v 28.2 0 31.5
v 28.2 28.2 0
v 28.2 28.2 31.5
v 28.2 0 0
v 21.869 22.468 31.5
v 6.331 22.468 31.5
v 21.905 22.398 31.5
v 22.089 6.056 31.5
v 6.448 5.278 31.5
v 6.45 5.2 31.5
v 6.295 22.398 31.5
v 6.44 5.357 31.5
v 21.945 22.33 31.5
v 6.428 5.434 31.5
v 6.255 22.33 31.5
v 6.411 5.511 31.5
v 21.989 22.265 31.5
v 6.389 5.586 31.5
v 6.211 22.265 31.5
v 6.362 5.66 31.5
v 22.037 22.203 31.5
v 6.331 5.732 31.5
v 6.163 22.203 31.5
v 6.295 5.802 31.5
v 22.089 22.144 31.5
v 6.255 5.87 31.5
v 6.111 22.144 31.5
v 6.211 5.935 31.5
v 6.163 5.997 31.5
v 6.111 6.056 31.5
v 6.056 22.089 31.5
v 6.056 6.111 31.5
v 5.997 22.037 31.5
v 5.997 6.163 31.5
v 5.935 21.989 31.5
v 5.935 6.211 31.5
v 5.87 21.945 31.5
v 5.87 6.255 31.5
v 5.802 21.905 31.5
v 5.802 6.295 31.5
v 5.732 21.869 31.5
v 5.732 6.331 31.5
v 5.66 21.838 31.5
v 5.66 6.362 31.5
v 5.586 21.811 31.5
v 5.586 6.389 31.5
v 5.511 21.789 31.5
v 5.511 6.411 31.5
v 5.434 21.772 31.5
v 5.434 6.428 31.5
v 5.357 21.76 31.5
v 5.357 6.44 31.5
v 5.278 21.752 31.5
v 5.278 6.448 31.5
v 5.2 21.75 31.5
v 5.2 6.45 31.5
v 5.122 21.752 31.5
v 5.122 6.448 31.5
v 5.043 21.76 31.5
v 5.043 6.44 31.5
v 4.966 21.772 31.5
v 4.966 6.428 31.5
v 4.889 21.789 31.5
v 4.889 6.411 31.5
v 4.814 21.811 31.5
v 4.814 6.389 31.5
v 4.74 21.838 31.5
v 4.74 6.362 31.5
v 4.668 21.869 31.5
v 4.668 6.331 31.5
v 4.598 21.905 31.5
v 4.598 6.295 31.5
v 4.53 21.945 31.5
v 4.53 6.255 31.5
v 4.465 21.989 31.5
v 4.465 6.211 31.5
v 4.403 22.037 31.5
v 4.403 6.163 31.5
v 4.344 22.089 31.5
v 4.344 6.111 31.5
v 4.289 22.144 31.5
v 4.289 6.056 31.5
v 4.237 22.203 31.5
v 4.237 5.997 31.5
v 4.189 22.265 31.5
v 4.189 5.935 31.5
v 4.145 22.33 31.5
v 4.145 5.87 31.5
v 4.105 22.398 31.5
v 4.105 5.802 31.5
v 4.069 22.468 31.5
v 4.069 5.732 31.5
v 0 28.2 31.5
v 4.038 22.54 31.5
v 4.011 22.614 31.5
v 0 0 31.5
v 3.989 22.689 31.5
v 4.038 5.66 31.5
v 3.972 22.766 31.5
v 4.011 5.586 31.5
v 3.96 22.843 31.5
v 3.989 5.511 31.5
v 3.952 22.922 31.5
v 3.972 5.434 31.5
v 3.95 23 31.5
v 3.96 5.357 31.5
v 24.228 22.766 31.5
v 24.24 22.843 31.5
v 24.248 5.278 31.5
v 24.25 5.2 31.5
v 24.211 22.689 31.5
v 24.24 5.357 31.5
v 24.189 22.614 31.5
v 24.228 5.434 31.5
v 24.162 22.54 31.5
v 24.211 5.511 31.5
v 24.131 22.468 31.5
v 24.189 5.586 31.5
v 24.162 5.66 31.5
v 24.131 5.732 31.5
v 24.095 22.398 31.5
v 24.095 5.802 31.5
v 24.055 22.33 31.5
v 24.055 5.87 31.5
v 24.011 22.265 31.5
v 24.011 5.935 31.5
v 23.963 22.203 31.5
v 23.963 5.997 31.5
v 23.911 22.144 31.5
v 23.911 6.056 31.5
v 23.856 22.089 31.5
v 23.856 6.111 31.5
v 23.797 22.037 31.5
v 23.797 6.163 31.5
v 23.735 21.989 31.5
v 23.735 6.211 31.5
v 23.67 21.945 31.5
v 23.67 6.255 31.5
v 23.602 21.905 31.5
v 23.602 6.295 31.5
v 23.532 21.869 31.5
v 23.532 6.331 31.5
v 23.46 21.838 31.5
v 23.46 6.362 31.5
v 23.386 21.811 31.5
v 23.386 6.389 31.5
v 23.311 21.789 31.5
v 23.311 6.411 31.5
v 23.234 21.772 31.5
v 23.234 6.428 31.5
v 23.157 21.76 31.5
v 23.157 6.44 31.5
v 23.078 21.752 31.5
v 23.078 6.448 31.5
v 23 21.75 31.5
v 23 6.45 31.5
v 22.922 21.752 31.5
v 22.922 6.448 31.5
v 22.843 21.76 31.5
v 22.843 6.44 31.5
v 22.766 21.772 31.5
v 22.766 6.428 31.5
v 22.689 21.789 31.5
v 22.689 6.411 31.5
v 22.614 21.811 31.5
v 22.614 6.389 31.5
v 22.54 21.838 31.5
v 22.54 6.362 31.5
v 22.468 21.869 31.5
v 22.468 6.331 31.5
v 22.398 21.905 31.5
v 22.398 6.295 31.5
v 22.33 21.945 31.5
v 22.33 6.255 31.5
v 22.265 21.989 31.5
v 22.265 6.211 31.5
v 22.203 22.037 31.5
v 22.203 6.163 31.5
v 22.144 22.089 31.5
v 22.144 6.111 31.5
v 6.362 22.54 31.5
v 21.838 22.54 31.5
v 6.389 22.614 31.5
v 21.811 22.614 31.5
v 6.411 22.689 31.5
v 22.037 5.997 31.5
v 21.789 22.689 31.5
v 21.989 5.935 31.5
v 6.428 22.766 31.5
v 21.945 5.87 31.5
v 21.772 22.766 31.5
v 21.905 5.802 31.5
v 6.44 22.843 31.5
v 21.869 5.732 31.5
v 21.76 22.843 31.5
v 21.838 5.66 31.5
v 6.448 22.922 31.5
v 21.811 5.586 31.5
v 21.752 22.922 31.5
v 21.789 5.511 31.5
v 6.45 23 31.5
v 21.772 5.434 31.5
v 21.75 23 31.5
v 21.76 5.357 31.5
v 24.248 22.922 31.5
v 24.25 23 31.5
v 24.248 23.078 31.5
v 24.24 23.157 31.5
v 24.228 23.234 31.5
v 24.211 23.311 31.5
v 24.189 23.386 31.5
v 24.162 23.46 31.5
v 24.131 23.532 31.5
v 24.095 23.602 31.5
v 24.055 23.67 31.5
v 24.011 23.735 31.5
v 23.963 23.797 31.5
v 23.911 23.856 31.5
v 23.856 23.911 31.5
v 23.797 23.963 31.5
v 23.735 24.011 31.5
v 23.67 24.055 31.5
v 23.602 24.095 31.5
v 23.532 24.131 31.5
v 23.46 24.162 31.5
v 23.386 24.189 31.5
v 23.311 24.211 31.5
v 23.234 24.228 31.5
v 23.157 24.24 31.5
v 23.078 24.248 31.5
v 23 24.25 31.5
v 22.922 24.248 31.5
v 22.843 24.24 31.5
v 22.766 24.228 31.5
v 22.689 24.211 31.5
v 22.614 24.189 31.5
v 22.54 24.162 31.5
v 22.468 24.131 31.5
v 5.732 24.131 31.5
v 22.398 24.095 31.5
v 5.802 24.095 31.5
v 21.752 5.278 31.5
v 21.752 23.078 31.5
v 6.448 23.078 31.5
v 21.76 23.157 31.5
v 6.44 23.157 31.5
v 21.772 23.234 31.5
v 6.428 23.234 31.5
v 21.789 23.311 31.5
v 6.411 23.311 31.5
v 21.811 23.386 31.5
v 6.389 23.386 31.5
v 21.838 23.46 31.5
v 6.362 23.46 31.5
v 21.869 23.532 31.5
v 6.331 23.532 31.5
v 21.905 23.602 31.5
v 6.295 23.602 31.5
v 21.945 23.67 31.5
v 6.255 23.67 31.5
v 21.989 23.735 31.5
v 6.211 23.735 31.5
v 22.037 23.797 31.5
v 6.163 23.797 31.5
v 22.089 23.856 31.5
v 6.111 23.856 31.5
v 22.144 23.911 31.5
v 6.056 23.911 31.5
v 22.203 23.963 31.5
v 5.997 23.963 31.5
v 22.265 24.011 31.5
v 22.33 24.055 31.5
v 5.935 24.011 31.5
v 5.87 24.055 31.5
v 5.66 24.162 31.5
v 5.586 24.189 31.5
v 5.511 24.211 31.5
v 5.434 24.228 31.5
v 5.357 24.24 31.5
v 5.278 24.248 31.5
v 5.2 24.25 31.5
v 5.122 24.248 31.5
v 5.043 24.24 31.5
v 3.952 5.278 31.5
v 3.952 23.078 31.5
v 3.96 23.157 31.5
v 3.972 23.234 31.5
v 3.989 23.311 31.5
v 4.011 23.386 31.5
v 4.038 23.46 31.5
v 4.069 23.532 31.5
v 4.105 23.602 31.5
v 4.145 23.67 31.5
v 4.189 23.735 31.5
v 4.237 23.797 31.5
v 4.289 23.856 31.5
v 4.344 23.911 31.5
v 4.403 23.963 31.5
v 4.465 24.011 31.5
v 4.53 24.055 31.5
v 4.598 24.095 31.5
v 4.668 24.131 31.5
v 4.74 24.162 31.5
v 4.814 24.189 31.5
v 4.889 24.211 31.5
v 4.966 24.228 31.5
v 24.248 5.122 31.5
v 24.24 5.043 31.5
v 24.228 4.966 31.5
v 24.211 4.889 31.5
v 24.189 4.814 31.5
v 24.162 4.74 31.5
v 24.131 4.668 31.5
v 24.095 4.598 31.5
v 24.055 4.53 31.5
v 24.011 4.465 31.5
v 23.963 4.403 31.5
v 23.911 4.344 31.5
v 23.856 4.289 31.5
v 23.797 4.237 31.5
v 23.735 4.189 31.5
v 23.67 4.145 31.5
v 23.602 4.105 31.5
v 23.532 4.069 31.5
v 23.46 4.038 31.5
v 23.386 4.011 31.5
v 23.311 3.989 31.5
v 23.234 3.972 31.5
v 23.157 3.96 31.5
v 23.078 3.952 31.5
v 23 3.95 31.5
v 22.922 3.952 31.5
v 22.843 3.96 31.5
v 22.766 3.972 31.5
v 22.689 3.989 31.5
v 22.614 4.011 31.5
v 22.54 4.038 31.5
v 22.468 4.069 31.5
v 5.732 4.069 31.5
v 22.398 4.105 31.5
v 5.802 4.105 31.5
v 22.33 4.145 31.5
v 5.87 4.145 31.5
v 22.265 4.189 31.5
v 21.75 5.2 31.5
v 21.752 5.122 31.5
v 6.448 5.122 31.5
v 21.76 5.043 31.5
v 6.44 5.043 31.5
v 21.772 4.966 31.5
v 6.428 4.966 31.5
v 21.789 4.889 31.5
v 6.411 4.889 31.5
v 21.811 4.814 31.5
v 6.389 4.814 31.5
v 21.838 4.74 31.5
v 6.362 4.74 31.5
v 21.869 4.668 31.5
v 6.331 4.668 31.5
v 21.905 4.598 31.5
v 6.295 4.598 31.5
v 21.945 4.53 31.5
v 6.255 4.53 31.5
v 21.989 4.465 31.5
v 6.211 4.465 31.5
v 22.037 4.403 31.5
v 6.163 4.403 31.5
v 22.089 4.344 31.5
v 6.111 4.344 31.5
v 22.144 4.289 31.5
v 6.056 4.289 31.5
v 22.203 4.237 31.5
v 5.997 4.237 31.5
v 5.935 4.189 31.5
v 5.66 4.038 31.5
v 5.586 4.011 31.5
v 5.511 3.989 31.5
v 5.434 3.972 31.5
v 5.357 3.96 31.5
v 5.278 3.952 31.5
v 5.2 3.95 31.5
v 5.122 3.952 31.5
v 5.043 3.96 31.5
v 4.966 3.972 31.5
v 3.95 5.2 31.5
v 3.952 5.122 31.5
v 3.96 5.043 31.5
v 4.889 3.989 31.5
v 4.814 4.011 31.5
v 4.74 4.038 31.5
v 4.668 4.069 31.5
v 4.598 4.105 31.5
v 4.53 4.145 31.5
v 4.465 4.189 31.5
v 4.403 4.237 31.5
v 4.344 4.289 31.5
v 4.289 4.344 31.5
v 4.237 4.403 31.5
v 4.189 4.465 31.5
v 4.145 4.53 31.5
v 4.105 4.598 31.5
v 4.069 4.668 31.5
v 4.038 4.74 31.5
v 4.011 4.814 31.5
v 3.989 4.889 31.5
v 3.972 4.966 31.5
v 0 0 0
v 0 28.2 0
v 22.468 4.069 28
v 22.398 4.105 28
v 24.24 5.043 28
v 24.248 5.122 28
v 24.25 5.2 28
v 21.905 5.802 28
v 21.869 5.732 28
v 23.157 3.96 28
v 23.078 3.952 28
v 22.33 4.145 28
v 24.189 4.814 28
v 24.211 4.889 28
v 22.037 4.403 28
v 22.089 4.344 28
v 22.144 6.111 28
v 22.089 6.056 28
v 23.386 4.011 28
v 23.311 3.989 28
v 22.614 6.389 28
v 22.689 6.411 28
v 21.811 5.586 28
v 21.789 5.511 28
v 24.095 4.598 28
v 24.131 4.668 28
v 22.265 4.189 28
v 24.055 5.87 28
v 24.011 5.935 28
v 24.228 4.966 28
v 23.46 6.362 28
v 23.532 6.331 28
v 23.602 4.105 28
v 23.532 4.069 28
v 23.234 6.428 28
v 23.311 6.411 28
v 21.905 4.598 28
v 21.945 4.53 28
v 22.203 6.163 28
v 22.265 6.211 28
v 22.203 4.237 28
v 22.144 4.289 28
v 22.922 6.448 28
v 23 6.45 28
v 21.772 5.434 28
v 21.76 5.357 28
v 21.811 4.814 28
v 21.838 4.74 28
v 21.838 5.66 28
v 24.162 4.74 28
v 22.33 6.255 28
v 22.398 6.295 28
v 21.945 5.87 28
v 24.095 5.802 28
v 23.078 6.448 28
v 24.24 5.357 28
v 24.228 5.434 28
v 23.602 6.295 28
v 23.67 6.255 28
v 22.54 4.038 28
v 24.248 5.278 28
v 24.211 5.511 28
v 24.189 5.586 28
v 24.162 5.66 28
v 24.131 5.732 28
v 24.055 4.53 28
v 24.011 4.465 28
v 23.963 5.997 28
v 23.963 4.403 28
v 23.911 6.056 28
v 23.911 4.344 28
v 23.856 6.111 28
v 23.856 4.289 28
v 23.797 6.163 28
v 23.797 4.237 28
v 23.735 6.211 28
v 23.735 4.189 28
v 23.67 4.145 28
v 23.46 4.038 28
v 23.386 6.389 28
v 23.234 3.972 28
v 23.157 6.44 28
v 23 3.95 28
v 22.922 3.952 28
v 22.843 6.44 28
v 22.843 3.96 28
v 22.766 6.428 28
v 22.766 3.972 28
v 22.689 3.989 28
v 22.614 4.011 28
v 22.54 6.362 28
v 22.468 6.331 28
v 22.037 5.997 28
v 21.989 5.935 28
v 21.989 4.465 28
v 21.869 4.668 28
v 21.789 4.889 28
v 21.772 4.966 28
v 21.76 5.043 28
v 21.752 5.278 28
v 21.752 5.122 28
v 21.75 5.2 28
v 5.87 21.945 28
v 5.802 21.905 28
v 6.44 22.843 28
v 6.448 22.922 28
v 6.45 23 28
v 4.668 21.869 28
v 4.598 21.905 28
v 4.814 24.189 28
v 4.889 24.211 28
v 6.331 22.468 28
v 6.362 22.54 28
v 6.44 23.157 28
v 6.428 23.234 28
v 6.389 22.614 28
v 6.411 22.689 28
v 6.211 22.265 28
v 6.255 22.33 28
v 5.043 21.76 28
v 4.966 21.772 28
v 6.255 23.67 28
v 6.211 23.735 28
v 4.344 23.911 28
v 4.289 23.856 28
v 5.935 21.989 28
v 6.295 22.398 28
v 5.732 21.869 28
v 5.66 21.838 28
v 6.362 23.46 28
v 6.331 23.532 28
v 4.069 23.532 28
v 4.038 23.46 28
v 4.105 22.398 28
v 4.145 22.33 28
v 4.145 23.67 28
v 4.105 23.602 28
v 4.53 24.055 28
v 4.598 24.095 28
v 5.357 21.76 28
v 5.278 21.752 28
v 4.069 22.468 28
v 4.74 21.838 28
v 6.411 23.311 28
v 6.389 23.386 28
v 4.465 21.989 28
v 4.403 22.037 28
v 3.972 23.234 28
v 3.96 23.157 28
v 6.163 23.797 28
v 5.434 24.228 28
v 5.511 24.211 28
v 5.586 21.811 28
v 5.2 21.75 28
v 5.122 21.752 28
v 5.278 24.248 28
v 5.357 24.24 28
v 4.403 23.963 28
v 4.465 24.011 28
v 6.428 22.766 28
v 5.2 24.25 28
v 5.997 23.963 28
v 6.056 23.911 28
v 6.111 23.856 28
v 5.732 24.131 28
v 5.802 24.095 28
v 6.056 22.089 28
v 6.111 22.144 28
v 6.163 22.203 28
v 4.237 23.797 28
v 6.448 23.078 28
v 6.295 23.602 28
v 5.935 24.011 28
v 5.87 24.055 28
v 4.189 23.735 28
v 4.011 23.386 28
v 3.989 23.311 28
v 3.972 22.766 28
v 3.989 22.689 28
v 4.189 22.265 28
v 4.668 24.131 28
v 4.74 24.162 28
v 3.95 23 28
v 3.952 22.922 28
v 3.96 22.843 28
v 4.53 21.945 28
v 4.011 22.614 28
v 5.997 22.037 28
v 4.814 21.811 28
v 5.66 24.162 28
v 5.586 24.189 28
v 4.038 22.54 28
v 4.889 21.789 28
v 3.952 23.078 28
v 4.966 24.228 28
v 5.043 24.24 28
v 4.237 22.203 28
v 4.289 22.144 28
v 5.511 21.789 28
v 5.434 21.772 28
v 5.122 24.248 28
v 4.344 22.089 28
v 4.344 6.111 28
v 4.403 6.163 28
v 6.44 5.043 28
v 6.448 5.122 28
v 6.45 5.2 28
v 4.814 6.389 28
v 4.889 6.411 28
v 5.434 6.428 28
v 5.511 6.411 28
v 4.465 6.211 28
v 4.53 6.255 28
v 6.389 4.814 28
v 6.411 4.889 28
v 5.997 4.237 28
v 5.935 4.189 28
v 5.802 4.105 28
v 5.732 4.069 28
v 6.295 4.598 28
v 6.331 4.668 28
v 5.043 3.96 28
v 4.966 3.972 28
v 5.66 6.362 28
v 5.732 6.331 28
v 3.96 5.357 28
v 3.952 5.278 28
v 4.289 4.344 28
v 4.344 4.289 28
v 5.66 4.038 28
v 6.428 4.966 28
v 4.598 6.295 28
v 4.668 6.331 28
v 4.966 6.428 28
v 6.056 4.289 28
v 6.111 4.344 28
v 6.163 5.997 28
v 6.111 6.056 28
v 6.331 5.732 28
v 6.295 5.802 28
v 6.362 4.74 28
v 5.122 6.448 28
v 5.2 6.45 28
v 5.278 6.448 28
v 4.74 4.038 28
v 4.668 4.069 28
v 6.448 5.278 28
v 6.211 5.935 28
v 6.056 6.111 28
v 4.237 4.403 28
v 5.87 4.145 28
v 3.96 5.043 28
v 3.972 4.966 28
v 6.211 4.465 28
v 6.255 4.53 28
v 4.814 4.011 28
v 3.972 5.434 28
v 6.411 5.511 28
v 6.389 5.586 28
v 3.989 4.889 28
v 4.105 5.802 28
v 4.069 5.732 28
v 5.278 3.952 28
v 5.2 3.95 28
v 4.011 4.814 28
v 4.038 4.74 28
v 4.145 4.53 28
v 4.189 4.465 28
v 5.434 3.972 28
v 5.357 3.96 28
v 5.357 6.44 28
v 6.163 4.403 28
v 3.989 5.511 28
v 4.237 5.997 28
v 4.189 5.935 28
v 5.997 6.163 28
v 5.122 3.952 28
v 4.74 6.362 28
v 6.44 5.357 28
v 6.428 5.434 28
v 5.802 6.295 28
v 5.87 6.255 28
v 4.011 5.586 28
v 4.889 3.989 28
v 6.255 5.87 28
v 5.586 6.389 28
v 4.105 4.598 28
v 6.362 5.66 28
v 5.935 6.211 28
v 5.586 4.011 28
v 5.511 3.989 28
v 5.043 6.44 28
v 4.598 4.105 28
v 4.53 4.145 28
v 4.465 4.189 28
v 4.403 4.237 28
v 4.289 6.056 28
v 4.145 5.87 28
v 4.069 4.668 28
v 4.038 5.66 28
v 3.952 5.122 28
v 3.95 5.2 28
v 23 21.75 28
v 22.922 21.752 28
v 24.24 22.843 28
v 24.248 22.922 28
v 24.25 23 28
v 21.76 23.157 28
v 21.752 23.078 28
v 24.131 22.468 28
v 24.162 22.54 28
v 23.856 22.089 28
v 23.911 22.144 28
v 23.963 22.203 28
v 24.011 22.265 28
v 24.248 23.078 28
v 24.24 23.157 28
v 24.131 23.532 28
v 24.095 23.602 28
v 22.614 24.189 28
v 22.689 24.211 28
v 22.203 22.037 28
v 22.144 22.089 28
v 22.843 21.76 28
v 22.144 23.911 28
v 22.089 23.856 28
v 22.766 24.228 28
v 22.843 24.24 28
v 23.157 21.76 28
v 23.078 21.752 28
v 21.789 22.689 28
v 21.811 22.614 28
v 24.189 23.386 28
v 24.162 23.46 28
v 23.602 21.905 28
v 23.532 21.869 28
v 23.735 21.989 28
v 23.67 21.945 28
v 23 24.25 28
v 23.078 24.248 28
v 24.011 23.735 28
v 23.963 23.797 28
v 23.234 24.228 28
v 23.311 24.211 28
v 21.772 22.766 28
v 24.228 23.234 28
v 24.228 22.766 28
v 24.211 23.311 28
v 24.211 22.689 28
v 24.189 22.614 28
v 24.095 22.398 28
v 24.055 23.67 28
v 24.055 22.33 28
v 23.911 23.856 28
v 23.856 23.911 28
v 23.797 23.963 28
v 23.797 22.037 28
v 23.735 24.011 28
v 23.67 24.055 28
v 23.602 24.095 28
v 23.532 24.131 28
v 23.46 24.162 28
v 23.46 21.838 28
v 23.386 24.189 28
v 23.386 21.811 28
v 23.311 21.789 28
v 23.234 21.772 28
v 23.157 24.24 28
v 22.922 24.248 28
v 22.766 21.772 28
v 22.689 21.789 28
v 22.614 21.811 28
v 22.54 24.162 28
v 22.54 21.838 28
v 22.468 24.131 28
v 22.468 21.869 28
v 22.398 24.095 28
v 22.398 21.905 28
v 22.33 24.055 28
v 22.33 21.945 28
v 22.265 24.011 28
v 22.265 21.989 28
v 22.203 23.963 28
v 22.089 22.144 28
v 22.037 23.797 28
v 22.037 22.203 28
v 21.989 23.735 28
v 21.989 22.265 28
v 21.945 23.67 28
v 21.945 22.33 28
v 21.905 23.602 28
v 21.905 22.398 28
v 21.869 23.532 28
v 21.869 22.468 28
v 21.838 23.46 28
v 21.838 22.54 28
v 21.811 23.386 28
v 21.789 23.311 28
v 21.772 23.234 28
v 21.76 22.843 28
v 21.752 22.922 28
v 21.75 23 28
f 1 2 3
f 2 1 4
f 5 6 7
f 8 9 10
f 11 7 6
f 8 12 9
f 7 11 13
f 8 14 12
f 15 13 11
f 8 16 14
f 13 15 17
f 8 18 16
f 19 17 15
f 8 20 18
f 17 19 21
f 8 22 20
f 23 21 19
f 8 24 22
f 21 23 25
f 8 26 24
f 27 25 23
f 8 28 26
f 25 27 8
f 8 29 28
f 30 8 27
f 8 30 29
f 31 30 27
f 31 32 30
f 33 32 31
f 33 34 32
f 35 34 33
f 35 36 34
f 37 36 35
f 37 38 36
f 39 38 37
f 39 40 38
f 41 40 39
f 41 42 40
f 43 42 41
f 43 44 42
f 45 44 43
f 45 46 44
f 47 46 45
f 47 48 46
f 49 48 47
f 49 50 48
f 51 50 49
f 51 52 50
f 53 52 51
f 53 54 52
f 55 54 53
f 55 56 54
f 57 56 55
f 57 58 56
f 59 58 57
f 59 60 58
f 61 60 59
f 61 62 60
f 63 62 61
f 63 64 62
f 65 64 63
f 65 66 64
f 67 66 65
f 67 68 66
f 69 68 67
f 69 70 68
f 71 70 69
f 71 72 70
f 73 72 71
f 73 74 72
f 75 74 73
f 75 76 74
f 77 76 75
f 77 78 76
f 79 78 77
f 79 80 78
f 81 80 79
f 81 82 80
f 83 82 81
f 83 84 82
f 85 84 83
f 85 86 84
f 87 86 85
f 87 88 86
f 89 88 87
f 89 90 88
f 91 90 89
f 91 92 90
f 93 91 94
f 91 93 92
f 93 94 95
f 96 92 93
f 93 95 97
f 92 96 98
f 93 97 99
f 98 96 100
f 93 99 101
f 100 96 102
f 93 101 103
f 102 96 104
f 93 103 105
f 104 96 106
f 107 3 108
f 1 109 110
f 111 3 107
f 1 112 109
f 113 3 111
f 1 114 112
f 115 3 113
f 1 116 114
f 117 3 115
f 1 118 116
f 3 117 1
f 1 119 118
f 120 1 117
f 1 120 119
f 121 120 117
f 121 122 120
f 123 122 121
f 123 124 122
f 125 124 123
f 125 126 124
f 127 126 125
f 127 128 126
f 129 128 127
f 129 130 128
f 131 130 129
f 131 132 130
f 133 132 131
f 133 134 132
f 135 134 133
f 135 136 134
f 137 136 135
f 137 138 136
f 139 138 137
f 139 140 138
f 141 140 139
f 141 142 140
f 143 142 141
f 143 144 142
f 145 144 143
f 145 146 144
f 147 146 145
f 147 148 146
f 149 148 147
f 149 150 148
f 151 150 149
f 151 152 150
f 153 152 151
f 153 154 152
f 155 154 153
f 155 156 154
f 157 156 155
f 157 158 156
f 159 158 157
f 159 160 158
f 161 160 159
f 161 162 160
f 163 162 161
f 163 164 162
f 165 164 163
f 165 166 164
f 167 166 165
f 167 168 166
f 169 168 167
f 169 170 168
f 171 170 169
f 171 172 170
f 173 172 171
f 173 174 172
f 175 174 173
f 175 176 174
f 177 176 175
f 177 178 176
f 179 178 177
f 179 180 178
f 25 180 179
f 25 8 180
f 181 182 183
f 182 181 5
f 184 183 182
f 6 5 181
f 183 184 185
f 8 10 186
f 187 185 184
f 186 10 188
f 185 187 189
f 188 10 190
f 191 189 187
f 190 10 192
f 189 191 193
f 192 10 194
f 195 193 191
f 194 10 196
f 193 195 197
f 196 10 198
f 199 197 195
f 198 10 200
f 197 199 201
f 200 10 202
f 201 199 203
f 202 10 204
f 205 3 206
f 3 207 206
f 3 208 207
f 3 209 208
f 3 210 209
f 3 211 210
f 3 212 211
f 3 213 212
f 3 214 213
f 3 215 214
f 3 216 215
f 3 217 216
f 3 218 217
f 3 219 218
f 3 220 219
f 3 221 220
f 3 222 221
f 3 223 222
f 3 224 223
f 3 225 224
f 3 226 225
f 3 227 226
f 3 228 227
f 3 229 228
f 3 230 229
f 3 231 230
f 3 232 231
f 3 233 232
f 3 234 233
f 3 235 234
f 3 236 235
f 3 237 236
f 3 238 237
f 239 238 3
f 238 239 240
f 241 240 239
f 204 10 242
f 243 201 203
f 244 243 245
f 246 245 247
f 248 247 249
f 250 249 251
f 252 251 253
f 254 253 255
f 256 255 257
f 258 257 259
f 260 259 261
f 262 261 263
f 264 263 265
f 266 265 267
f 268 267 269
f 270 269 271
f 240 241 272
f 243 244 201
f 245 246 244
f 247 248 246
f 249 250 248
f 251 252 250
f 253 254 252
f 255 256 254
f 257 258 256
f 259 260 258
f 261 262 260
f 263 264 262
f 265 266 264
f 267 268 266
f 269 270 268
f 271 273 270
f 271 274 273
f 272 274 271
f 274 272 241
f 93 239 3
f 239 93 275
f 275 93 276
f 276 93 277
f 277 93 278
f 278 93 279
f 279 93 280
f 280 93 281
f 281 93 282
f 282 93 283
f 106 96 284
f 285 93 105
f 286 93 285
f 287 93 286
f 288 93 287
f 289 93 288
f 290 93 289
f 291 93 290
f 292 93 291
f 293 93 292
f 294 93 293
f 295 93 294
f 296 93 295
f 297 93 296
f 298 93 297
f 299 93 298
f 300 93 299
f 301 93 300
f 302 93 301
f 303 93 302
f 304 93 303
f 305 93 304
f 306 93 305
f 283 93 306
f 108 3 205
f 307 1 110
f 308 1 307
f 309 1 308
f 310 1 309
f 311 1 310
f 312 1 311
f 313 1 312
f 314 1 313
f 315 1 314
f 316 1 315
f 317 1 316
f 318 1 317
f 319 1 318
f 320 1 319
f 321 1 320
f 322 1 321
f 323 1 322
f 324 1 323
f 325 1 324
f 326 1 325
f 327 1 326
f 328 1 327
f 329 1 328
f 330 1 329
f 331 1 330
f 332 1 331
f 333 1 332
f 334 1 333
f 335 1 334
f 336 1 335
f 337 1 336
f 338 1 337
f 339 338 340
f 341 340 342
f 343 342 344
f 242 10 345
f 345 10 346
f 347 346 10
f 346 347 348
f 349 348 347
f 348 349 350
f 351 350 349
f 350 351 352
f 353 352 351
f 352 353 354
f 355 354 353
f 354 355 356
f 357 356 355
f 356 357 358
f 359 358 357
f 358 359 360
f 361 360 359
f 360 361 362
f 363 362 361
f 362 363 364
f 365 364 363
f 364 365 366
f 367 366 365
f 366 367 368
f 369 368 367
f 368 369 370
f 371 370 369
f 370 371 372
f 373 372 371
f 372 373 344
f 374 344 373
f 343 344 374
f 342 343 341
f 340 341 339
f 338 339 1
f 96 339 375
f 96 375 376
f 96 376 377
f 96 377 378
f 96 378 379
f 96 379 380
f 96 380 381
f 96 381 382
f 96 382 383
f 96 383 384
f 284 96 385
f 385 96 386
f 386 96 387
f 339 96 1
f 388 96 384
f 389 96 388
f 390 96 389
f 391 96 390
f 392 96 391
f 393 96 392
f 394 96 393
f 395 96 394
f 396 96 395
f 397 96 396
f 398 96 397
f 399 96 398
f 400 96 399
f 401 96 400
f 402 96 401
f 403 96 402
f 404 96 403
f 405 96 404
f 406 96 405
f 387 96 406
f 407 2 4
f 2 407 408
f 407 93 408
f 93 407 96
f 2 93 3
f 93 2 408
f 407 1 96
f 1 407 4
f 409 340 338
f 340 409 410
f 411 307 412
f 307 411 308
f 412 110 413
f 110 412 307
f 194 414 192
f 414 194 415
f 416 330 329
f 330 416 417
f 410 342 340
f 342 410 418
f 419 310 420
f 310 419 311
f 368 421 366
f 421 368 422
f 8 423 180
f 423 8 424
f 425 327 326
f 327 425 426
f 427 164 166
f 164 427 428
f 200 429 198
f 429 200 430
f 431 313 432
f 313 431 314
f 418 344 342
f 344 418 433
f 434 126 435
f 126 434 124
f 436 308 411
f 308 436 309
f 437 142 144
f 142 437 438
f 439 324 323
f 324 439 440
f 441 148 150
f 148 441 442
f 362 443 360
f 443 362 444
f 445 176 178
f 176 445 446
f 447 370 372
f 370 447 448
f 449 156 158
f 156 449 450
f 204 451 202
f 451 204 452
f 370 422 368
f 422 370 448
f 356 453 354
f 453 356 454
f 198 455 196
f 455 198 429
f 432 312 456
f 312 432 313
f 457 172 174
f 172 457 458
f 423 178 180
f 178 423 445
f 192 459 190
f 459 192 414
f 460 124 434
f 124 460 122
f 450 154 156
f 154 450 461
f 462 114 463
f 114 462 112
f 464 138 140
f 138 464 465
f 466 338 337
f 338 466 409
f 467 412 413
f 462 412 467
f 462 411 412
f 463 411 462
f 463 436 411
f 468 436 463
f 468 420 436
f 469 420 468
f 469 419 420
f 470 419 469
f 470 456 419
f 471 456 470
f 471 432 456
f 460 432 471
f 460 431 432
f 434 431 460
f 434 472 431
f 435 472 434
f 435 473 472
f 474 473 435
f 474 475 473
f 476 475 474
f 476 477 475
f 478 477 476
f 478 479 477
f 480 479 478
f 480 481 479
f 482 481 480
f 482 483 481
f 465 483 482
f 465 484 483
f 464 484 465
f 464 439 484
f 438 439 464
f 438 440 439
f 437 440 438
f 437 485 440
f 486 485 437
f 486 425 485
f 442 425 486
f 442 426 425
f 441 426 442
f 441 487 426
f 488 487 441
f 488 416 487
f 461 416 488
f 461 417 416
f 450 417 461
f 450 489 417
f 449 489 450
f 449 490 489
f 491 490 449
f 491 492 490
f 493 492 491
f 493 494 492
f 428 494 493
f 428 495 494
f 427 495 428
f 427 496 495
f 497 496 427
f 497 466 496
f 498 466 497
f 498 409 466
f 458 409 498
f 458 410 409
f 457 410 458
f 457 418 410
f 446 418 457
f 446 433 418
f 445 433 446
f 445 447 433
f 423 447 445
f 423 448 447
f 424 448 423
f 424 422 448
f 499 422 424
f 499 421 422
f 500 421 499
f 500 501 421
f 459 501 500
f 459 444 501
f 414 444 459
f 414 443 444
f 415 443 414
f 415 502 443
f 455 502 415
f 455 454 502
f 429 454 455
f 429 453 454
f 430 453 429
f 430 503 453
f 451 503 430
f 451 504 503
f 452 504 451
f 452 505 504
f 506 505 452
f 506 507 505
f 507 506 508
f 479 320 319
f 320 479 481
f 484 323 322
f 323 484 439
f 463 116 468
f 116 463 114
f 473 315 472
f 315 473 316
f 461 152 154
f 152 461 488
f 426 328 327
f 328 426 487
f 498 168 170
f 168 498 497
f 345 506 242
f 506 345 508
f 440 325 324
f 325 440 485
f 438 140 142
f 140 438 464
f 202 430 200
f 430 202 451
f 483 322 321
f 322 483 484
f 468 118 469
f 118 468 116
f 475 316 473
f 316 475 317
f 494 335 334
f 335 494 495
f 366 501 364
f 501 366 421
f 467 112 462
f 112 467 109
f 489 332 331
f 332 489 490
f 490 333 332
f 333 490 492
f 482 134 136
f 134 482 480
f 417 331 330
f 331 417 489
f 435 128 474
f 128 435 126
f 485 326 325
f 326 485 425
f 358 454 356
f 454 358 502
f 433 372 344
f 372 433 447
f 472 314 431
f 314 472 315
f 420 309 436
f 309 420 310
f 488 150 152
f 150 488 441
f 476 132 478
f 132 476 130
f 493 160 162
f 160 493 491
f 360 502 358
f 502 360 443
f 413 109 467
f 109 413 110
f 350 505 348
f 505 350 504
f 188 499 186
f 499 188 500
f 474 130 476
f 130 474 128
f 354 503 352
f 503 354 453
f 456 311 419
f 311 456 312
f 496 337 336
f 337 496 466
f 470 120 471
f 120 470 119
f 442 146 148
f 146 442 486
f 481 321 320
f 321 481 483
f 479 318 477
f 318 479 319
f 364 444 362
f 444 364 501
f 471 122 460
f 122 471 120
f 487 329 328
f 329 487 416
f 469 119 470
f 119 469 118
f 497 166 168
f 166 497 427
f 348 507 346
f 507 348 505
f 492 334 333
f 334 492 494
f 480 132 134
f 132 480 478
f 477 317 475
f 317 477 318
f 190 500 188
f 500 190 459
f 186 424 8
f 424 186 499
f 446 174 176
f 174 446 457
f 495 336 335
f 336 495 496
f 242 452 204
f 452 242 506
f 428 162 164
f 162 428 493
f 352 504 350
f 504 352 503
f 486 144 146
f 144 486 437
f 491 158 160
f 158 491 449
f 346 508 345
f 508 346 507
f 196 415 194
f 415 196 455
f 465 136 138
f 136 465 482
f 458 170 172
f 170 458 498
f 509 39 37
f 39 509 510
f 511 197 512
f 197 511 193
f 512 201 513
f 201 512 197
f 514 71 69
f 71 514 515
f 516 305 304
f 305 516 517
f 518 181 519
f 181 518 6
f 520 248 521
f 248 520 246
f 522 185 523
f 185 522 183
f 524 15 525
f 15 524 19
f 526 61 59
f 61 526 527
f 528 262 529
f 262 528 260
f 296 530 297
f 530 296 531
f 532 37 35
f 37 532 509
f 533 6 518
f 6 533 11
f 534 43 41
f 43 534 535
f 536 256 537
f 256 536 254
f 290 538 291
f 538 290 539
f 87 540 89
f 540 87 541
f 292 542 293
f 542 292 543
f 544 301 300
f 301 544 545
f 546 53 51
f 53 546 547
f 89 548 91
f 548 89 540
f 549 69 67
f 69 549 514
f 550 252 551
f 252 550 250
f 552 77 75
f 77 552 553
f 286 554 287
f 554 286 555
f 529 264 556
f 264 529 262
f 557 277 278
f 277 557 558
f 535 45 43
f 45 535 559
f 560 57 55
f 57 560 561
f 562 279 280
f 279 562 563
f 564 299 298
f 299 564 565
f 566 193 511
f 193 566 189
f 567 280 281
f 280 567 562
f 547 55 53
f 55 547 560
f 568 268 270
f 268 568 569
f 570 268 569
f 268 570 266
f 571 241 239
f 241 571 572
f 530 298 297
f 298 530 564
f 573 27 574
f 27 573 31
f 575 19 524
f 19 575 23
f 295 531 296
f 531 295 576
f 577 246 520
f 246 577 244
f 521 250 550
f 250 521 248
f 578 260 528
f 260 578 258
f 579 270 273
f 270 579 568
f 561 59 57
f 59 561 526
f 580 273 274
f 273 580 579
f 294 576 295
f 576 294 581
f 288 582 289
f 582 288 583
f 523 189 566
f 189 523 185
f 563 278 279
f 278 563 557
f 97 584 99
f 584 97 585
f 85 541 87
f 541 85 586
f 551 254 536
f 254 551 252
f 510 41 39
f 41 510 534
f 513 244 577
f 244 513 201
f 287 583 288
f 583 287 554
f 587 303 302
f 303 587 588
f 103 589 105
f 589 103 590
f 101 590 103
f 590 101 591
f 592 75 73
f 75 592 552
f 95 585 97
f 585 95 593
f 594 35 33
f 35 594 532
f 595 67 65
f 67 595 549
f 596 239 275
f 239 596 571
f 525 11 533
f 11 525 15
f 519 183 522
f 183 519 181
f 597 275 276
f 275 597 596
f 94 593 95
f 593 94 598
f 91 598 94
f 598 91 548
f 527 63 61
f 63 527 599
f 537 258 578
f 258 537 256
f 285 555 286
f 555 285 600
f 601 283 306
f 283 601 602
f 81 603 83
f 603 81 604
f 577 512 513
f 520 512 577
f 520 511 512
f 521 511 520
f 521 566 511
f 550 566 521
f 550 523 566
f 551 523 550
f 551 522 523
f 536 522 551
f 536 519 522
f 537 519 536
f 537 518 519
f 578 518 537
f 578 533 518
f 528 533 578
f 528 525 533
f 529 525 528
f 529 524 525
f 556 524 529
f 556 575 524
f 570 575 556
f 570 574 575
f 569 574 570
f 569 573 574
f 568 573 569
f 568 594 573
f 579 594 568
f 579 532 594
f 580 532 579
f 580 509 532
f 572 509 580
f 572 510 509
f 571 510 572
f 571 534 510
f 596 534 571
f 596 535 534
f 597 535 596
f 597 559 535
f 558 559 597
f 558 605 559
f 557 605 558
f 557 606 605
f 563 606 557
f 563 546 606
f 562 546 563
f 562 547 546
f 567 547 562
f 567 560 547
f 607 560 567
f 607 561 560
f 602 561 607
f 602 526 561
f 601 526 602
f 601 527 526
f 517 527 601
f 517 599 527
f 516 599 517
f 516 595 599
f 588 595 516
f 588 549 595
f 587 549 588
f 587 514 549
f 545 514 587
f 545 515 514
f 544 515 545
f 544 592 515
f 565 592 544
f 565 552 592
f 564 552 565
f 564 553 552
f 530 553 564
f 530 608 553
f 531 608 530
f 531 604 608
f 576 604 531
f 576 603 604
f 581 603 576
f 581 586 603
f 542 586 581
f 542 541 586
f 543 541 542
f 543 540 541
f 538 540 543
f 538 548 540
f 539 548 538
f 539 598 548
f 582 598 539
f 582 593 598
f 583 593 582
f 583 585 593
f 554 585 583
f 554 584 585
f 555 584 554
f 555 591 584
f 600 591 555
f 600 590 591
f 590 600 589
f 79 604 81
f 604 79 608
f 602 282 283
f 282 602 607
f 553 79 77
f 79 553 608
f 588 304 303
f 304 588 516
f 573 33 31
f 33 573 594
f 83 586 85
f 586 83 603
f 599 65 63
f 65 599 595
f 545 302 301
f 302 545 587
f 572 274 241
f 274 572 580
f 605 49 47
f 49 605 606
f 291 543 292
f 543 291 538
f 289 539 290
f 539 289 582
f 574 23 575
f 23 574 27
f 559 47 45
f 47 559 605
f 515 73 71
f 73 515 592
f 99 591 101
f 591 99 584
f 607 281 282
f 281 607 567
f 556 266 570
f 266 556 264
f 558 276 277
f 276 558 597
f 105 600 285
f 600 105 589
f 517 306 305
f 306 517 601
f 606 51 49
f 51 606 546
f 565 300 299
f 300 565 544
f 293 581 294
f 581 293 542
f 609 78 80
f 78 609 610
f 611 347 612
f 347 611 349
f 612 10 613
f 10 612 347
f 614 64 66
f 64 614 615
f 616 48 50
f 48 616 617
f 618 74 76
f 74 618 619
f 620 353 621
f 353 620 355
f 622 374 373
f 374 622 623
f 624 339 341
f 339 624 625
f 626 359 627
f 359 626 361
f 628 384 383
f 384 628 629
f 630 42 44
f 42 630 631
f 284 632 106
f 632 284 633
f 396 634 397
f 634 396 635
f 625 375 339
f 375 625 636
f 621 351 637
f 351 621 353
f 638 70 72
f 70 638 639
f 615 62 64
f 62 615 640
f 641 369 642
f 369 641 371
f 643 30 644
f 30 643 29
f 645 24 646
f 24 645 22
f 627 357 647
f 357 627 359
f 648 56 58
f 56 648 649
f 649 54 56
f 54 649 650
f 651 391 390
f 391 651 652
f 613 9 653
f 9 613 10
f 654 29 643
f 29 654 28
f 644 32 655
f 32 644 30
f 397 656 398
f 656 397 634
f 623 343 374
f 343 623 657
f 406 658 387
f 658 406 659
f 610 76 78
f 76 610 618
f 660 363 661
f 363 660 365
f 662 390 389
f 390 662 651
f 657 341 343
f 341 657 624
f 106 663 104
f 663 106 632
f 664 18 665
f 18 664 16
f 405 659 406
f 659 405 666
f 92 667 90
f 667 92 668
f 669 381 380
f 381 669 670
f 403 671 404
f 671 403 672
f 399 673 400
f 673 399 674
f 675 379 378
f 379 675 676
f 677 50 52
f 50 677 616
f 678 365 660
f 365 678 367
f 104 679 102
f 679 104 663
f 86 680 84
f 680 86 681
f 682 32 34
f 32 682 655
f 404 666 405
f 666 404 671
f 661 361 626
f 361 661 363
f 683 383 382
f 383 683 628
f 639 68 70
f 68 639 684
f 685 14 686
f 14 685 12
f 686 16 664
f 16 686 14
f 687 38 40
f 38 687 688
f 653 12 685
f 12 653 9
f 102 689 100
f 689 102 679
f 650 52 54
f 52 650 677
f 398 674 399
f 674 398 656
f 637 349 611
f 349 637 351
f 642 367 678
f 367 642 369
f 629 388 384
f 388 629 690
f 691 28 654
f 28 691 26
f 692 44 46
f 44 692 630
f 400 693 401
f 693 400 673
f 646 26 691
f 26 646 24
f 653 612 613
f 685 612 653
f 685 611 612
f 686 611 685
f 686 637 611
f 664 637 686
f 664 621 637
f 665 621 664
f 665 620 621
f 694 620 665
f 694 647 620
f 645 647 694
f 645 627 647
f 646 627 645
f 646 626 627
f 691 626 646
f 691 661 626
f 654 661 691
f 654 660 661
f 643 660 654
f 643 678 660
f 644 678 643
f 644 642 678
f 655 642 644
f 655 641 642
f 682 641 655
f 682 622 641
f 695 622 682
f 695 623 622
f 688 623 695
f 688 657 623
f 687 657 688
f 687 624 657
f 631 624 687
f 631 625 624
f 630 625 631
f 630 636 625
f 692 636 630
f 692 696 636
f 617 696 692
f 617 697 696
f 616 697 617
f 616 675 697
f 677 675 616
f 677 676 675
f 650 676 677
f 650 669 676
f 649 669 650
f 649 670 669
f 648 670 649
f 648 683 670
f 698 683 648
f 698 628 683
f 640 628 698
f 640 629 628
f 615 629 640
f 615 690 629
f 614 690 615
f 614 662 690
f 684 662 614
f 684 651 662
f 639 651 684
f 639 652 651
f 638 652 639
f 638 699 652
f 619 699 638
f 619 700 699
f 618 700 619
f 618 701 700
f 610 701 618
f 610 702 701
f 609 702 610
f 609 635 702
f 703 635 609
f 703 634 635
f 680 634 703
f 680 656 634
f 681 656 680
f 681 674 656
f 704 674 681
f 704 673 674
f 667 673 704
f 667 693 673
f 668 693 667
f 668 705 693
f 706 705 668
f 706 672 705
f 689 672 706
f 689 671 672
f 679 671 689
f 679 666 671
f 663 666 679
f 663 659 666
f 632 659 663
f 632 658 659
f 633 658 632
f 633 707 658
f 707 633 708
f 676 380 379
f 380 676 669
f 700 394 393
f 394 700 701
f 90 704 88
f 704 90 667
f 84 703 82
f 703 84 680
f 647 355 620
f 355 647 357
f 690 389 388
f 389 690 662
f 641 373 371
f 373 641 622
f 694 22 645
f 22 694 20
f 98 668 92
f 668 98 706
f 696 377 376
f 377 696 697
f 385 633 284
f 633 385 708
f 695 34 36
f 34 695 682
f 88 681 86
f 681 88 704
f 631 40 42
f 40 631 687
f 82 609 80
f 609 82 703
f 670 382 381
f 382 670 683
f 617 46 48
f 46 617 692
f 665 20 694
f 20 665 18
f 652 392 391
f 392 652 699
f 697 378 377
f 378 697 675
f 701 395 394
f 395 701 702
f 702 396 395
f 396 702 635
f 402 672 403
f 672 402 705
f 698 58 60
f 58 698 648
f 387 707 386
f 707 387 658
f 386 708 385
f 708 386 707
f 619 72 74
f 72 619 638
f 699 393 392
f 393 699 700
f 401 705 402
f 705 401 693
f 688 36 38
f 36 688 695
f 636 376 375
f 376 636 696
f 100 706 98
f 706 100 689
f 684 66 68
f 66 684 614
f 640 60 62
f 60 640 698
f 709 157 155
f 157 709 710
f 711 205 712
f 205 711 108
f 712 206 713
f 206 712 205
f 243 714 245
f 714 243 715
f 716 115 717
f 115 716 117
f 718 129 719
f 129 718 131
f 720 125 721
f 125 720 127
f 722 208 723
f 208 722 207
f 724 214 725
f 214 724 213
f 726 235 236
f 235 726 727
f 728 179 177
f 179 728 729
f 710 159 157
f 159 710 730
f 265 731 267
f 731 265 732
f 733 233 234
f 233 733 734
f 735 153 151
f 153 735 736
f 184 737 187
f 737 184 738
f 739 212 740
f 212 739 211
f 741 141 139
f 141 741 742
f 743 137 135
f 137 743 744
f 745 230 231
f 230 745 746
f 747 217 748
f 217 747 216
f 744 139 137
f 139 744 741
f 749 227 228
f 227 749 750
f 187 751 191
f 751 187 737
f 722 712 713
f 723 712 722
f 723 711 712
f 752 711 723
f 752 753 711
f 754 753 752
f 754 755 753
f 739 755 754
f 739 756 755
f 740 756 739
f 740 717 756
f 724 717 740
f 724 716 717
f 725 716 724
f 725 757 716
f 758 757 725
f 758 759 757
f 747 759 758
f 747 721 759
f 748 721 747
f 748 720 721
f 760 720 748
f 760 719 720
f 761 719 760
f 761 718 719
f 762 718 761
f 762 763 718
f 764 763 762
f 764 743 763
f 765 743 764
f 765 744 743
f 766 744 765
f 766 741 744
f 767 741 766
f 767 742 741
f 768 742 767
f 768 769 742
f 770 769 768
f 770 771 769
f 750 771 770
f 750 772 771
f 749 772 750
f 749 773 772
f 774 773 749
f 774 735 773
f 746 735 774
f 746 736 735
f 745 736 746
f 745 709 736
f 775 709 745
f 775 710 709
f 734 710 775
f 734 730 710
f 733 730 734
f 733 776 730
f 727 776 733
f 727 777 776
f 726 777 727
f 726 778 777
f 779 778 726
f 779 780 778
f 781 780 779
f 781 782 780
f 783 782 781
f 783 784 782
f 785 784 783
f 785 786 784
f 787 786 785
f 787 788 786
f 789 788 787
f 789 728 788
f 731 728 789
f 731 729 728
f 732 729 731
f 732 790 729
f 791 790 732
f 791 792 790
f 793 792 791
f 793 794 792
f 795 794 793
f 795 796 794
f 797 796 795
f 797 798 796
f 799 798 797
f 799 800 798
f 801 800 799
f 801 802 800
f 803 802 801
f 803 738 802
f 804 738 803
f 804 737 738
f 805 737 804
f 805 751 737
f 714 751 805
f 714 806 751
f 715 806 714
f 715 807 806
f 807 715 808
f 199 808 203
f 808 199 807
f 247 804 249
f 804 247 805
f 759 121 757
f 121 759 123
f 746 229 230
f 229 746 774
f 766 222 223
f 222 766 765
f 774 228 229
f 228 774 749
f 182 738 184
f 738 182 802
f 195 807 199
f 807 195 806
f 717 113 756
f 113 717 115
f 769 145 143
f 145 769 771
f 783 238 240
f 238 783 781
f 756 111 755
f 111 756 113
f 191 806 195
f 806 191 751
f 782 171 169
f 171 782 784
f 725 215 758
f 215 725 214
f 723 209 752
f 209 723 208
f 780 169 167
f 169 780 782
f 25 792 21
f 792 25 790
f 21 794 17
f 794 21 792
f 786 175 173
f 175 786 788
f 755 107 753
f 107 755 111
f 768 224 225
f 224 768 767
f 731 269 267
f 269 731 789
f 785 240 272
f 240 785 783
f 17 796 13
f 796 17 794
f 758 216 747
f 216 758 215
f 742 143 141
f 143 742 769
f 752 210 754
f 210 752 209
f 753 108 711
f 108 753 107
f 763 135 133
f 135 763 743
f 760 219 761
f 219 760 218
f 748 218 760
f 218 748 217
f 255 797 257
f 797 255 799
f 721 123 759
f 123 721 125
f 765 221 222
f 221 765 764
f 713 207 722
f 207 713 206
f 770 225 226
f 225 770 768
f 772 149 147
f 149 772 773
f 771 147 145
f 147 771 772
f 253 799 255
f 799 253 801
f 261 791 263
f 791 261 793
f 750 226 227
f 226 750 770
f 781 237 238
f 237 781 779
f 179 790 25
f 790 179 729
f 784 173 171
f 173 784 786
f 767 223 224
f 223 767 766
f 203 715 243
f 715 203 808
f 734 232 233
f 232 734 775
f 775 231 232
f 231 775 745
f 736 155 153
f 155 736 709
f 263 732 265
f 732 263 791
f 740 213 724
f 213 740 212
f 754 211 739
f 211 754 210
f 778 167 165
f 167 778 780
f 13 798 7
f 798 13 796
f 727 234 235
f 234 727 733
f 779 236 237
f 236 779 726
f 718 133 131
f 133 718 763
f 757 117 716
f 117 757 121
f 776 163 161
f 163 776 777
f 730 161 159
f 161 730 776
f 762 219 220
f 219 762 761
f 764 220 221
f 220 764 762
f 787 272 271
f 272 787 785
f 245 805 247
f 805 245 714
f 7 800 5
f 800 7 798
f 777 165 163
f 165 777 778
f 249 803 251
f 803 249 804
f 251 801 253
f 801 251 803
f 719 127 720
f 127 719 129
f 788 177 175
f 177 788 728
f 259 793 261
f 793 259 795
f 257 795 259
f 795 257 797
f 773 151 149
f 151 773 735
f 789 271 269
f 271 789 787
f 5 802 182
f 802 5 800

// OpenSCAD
union(){
difference() {
	color("gray")cube([28.2, 28.2, 31.5]);
	translate([23, 5.2, 30])rotate ([180,0,0]) cylinder (h = 4, r=1.25, center = true, $fn=100);
    translate([5.2, 23, 30])rotate([180, 0, 0])cylinder (h = 4, r=1.25, center = true, $fn=100);
    translate([5.2, 5.2, 30])rotate([180, 0, 0])cylinder (h = 4, r=1.25, center = true, $fn=100);
     translate([23, 23, 30])rotate([180, 0, 0])cylinder (h = 4, r=1.25, center = true, $fn=100);
}
}
//------------------------------------------------
//module nema11()
//{
  
//    union()
//    {
       


//        translate([-14, -14, -31])
//     difference(){
//        color("gray")cube([28.2, 28.2, 31.5]);
//	translate([23, 23, 33.5])rotate ([180,0,0]) cylinder (h = 4, r=1.25, center = true, $fn=100);
     
//         translate([33.5, 23, 23])rotate ([180,0,0]) cylinder (h = 4, r=1.25, center = true, $fn=100);
// }
 
//        translate([0, 0, 31.5])
//        cylinder(r=2,h=1);

//        translate([0, 0, 31.5])
//        color("yellow")cylinder (h=2, r=11, $fn=30);
//        translate([0, 0, 31.5])
//         cylinder(h=20, r=2.5, $fn=30);
        
//    }
//}
//nema11();
